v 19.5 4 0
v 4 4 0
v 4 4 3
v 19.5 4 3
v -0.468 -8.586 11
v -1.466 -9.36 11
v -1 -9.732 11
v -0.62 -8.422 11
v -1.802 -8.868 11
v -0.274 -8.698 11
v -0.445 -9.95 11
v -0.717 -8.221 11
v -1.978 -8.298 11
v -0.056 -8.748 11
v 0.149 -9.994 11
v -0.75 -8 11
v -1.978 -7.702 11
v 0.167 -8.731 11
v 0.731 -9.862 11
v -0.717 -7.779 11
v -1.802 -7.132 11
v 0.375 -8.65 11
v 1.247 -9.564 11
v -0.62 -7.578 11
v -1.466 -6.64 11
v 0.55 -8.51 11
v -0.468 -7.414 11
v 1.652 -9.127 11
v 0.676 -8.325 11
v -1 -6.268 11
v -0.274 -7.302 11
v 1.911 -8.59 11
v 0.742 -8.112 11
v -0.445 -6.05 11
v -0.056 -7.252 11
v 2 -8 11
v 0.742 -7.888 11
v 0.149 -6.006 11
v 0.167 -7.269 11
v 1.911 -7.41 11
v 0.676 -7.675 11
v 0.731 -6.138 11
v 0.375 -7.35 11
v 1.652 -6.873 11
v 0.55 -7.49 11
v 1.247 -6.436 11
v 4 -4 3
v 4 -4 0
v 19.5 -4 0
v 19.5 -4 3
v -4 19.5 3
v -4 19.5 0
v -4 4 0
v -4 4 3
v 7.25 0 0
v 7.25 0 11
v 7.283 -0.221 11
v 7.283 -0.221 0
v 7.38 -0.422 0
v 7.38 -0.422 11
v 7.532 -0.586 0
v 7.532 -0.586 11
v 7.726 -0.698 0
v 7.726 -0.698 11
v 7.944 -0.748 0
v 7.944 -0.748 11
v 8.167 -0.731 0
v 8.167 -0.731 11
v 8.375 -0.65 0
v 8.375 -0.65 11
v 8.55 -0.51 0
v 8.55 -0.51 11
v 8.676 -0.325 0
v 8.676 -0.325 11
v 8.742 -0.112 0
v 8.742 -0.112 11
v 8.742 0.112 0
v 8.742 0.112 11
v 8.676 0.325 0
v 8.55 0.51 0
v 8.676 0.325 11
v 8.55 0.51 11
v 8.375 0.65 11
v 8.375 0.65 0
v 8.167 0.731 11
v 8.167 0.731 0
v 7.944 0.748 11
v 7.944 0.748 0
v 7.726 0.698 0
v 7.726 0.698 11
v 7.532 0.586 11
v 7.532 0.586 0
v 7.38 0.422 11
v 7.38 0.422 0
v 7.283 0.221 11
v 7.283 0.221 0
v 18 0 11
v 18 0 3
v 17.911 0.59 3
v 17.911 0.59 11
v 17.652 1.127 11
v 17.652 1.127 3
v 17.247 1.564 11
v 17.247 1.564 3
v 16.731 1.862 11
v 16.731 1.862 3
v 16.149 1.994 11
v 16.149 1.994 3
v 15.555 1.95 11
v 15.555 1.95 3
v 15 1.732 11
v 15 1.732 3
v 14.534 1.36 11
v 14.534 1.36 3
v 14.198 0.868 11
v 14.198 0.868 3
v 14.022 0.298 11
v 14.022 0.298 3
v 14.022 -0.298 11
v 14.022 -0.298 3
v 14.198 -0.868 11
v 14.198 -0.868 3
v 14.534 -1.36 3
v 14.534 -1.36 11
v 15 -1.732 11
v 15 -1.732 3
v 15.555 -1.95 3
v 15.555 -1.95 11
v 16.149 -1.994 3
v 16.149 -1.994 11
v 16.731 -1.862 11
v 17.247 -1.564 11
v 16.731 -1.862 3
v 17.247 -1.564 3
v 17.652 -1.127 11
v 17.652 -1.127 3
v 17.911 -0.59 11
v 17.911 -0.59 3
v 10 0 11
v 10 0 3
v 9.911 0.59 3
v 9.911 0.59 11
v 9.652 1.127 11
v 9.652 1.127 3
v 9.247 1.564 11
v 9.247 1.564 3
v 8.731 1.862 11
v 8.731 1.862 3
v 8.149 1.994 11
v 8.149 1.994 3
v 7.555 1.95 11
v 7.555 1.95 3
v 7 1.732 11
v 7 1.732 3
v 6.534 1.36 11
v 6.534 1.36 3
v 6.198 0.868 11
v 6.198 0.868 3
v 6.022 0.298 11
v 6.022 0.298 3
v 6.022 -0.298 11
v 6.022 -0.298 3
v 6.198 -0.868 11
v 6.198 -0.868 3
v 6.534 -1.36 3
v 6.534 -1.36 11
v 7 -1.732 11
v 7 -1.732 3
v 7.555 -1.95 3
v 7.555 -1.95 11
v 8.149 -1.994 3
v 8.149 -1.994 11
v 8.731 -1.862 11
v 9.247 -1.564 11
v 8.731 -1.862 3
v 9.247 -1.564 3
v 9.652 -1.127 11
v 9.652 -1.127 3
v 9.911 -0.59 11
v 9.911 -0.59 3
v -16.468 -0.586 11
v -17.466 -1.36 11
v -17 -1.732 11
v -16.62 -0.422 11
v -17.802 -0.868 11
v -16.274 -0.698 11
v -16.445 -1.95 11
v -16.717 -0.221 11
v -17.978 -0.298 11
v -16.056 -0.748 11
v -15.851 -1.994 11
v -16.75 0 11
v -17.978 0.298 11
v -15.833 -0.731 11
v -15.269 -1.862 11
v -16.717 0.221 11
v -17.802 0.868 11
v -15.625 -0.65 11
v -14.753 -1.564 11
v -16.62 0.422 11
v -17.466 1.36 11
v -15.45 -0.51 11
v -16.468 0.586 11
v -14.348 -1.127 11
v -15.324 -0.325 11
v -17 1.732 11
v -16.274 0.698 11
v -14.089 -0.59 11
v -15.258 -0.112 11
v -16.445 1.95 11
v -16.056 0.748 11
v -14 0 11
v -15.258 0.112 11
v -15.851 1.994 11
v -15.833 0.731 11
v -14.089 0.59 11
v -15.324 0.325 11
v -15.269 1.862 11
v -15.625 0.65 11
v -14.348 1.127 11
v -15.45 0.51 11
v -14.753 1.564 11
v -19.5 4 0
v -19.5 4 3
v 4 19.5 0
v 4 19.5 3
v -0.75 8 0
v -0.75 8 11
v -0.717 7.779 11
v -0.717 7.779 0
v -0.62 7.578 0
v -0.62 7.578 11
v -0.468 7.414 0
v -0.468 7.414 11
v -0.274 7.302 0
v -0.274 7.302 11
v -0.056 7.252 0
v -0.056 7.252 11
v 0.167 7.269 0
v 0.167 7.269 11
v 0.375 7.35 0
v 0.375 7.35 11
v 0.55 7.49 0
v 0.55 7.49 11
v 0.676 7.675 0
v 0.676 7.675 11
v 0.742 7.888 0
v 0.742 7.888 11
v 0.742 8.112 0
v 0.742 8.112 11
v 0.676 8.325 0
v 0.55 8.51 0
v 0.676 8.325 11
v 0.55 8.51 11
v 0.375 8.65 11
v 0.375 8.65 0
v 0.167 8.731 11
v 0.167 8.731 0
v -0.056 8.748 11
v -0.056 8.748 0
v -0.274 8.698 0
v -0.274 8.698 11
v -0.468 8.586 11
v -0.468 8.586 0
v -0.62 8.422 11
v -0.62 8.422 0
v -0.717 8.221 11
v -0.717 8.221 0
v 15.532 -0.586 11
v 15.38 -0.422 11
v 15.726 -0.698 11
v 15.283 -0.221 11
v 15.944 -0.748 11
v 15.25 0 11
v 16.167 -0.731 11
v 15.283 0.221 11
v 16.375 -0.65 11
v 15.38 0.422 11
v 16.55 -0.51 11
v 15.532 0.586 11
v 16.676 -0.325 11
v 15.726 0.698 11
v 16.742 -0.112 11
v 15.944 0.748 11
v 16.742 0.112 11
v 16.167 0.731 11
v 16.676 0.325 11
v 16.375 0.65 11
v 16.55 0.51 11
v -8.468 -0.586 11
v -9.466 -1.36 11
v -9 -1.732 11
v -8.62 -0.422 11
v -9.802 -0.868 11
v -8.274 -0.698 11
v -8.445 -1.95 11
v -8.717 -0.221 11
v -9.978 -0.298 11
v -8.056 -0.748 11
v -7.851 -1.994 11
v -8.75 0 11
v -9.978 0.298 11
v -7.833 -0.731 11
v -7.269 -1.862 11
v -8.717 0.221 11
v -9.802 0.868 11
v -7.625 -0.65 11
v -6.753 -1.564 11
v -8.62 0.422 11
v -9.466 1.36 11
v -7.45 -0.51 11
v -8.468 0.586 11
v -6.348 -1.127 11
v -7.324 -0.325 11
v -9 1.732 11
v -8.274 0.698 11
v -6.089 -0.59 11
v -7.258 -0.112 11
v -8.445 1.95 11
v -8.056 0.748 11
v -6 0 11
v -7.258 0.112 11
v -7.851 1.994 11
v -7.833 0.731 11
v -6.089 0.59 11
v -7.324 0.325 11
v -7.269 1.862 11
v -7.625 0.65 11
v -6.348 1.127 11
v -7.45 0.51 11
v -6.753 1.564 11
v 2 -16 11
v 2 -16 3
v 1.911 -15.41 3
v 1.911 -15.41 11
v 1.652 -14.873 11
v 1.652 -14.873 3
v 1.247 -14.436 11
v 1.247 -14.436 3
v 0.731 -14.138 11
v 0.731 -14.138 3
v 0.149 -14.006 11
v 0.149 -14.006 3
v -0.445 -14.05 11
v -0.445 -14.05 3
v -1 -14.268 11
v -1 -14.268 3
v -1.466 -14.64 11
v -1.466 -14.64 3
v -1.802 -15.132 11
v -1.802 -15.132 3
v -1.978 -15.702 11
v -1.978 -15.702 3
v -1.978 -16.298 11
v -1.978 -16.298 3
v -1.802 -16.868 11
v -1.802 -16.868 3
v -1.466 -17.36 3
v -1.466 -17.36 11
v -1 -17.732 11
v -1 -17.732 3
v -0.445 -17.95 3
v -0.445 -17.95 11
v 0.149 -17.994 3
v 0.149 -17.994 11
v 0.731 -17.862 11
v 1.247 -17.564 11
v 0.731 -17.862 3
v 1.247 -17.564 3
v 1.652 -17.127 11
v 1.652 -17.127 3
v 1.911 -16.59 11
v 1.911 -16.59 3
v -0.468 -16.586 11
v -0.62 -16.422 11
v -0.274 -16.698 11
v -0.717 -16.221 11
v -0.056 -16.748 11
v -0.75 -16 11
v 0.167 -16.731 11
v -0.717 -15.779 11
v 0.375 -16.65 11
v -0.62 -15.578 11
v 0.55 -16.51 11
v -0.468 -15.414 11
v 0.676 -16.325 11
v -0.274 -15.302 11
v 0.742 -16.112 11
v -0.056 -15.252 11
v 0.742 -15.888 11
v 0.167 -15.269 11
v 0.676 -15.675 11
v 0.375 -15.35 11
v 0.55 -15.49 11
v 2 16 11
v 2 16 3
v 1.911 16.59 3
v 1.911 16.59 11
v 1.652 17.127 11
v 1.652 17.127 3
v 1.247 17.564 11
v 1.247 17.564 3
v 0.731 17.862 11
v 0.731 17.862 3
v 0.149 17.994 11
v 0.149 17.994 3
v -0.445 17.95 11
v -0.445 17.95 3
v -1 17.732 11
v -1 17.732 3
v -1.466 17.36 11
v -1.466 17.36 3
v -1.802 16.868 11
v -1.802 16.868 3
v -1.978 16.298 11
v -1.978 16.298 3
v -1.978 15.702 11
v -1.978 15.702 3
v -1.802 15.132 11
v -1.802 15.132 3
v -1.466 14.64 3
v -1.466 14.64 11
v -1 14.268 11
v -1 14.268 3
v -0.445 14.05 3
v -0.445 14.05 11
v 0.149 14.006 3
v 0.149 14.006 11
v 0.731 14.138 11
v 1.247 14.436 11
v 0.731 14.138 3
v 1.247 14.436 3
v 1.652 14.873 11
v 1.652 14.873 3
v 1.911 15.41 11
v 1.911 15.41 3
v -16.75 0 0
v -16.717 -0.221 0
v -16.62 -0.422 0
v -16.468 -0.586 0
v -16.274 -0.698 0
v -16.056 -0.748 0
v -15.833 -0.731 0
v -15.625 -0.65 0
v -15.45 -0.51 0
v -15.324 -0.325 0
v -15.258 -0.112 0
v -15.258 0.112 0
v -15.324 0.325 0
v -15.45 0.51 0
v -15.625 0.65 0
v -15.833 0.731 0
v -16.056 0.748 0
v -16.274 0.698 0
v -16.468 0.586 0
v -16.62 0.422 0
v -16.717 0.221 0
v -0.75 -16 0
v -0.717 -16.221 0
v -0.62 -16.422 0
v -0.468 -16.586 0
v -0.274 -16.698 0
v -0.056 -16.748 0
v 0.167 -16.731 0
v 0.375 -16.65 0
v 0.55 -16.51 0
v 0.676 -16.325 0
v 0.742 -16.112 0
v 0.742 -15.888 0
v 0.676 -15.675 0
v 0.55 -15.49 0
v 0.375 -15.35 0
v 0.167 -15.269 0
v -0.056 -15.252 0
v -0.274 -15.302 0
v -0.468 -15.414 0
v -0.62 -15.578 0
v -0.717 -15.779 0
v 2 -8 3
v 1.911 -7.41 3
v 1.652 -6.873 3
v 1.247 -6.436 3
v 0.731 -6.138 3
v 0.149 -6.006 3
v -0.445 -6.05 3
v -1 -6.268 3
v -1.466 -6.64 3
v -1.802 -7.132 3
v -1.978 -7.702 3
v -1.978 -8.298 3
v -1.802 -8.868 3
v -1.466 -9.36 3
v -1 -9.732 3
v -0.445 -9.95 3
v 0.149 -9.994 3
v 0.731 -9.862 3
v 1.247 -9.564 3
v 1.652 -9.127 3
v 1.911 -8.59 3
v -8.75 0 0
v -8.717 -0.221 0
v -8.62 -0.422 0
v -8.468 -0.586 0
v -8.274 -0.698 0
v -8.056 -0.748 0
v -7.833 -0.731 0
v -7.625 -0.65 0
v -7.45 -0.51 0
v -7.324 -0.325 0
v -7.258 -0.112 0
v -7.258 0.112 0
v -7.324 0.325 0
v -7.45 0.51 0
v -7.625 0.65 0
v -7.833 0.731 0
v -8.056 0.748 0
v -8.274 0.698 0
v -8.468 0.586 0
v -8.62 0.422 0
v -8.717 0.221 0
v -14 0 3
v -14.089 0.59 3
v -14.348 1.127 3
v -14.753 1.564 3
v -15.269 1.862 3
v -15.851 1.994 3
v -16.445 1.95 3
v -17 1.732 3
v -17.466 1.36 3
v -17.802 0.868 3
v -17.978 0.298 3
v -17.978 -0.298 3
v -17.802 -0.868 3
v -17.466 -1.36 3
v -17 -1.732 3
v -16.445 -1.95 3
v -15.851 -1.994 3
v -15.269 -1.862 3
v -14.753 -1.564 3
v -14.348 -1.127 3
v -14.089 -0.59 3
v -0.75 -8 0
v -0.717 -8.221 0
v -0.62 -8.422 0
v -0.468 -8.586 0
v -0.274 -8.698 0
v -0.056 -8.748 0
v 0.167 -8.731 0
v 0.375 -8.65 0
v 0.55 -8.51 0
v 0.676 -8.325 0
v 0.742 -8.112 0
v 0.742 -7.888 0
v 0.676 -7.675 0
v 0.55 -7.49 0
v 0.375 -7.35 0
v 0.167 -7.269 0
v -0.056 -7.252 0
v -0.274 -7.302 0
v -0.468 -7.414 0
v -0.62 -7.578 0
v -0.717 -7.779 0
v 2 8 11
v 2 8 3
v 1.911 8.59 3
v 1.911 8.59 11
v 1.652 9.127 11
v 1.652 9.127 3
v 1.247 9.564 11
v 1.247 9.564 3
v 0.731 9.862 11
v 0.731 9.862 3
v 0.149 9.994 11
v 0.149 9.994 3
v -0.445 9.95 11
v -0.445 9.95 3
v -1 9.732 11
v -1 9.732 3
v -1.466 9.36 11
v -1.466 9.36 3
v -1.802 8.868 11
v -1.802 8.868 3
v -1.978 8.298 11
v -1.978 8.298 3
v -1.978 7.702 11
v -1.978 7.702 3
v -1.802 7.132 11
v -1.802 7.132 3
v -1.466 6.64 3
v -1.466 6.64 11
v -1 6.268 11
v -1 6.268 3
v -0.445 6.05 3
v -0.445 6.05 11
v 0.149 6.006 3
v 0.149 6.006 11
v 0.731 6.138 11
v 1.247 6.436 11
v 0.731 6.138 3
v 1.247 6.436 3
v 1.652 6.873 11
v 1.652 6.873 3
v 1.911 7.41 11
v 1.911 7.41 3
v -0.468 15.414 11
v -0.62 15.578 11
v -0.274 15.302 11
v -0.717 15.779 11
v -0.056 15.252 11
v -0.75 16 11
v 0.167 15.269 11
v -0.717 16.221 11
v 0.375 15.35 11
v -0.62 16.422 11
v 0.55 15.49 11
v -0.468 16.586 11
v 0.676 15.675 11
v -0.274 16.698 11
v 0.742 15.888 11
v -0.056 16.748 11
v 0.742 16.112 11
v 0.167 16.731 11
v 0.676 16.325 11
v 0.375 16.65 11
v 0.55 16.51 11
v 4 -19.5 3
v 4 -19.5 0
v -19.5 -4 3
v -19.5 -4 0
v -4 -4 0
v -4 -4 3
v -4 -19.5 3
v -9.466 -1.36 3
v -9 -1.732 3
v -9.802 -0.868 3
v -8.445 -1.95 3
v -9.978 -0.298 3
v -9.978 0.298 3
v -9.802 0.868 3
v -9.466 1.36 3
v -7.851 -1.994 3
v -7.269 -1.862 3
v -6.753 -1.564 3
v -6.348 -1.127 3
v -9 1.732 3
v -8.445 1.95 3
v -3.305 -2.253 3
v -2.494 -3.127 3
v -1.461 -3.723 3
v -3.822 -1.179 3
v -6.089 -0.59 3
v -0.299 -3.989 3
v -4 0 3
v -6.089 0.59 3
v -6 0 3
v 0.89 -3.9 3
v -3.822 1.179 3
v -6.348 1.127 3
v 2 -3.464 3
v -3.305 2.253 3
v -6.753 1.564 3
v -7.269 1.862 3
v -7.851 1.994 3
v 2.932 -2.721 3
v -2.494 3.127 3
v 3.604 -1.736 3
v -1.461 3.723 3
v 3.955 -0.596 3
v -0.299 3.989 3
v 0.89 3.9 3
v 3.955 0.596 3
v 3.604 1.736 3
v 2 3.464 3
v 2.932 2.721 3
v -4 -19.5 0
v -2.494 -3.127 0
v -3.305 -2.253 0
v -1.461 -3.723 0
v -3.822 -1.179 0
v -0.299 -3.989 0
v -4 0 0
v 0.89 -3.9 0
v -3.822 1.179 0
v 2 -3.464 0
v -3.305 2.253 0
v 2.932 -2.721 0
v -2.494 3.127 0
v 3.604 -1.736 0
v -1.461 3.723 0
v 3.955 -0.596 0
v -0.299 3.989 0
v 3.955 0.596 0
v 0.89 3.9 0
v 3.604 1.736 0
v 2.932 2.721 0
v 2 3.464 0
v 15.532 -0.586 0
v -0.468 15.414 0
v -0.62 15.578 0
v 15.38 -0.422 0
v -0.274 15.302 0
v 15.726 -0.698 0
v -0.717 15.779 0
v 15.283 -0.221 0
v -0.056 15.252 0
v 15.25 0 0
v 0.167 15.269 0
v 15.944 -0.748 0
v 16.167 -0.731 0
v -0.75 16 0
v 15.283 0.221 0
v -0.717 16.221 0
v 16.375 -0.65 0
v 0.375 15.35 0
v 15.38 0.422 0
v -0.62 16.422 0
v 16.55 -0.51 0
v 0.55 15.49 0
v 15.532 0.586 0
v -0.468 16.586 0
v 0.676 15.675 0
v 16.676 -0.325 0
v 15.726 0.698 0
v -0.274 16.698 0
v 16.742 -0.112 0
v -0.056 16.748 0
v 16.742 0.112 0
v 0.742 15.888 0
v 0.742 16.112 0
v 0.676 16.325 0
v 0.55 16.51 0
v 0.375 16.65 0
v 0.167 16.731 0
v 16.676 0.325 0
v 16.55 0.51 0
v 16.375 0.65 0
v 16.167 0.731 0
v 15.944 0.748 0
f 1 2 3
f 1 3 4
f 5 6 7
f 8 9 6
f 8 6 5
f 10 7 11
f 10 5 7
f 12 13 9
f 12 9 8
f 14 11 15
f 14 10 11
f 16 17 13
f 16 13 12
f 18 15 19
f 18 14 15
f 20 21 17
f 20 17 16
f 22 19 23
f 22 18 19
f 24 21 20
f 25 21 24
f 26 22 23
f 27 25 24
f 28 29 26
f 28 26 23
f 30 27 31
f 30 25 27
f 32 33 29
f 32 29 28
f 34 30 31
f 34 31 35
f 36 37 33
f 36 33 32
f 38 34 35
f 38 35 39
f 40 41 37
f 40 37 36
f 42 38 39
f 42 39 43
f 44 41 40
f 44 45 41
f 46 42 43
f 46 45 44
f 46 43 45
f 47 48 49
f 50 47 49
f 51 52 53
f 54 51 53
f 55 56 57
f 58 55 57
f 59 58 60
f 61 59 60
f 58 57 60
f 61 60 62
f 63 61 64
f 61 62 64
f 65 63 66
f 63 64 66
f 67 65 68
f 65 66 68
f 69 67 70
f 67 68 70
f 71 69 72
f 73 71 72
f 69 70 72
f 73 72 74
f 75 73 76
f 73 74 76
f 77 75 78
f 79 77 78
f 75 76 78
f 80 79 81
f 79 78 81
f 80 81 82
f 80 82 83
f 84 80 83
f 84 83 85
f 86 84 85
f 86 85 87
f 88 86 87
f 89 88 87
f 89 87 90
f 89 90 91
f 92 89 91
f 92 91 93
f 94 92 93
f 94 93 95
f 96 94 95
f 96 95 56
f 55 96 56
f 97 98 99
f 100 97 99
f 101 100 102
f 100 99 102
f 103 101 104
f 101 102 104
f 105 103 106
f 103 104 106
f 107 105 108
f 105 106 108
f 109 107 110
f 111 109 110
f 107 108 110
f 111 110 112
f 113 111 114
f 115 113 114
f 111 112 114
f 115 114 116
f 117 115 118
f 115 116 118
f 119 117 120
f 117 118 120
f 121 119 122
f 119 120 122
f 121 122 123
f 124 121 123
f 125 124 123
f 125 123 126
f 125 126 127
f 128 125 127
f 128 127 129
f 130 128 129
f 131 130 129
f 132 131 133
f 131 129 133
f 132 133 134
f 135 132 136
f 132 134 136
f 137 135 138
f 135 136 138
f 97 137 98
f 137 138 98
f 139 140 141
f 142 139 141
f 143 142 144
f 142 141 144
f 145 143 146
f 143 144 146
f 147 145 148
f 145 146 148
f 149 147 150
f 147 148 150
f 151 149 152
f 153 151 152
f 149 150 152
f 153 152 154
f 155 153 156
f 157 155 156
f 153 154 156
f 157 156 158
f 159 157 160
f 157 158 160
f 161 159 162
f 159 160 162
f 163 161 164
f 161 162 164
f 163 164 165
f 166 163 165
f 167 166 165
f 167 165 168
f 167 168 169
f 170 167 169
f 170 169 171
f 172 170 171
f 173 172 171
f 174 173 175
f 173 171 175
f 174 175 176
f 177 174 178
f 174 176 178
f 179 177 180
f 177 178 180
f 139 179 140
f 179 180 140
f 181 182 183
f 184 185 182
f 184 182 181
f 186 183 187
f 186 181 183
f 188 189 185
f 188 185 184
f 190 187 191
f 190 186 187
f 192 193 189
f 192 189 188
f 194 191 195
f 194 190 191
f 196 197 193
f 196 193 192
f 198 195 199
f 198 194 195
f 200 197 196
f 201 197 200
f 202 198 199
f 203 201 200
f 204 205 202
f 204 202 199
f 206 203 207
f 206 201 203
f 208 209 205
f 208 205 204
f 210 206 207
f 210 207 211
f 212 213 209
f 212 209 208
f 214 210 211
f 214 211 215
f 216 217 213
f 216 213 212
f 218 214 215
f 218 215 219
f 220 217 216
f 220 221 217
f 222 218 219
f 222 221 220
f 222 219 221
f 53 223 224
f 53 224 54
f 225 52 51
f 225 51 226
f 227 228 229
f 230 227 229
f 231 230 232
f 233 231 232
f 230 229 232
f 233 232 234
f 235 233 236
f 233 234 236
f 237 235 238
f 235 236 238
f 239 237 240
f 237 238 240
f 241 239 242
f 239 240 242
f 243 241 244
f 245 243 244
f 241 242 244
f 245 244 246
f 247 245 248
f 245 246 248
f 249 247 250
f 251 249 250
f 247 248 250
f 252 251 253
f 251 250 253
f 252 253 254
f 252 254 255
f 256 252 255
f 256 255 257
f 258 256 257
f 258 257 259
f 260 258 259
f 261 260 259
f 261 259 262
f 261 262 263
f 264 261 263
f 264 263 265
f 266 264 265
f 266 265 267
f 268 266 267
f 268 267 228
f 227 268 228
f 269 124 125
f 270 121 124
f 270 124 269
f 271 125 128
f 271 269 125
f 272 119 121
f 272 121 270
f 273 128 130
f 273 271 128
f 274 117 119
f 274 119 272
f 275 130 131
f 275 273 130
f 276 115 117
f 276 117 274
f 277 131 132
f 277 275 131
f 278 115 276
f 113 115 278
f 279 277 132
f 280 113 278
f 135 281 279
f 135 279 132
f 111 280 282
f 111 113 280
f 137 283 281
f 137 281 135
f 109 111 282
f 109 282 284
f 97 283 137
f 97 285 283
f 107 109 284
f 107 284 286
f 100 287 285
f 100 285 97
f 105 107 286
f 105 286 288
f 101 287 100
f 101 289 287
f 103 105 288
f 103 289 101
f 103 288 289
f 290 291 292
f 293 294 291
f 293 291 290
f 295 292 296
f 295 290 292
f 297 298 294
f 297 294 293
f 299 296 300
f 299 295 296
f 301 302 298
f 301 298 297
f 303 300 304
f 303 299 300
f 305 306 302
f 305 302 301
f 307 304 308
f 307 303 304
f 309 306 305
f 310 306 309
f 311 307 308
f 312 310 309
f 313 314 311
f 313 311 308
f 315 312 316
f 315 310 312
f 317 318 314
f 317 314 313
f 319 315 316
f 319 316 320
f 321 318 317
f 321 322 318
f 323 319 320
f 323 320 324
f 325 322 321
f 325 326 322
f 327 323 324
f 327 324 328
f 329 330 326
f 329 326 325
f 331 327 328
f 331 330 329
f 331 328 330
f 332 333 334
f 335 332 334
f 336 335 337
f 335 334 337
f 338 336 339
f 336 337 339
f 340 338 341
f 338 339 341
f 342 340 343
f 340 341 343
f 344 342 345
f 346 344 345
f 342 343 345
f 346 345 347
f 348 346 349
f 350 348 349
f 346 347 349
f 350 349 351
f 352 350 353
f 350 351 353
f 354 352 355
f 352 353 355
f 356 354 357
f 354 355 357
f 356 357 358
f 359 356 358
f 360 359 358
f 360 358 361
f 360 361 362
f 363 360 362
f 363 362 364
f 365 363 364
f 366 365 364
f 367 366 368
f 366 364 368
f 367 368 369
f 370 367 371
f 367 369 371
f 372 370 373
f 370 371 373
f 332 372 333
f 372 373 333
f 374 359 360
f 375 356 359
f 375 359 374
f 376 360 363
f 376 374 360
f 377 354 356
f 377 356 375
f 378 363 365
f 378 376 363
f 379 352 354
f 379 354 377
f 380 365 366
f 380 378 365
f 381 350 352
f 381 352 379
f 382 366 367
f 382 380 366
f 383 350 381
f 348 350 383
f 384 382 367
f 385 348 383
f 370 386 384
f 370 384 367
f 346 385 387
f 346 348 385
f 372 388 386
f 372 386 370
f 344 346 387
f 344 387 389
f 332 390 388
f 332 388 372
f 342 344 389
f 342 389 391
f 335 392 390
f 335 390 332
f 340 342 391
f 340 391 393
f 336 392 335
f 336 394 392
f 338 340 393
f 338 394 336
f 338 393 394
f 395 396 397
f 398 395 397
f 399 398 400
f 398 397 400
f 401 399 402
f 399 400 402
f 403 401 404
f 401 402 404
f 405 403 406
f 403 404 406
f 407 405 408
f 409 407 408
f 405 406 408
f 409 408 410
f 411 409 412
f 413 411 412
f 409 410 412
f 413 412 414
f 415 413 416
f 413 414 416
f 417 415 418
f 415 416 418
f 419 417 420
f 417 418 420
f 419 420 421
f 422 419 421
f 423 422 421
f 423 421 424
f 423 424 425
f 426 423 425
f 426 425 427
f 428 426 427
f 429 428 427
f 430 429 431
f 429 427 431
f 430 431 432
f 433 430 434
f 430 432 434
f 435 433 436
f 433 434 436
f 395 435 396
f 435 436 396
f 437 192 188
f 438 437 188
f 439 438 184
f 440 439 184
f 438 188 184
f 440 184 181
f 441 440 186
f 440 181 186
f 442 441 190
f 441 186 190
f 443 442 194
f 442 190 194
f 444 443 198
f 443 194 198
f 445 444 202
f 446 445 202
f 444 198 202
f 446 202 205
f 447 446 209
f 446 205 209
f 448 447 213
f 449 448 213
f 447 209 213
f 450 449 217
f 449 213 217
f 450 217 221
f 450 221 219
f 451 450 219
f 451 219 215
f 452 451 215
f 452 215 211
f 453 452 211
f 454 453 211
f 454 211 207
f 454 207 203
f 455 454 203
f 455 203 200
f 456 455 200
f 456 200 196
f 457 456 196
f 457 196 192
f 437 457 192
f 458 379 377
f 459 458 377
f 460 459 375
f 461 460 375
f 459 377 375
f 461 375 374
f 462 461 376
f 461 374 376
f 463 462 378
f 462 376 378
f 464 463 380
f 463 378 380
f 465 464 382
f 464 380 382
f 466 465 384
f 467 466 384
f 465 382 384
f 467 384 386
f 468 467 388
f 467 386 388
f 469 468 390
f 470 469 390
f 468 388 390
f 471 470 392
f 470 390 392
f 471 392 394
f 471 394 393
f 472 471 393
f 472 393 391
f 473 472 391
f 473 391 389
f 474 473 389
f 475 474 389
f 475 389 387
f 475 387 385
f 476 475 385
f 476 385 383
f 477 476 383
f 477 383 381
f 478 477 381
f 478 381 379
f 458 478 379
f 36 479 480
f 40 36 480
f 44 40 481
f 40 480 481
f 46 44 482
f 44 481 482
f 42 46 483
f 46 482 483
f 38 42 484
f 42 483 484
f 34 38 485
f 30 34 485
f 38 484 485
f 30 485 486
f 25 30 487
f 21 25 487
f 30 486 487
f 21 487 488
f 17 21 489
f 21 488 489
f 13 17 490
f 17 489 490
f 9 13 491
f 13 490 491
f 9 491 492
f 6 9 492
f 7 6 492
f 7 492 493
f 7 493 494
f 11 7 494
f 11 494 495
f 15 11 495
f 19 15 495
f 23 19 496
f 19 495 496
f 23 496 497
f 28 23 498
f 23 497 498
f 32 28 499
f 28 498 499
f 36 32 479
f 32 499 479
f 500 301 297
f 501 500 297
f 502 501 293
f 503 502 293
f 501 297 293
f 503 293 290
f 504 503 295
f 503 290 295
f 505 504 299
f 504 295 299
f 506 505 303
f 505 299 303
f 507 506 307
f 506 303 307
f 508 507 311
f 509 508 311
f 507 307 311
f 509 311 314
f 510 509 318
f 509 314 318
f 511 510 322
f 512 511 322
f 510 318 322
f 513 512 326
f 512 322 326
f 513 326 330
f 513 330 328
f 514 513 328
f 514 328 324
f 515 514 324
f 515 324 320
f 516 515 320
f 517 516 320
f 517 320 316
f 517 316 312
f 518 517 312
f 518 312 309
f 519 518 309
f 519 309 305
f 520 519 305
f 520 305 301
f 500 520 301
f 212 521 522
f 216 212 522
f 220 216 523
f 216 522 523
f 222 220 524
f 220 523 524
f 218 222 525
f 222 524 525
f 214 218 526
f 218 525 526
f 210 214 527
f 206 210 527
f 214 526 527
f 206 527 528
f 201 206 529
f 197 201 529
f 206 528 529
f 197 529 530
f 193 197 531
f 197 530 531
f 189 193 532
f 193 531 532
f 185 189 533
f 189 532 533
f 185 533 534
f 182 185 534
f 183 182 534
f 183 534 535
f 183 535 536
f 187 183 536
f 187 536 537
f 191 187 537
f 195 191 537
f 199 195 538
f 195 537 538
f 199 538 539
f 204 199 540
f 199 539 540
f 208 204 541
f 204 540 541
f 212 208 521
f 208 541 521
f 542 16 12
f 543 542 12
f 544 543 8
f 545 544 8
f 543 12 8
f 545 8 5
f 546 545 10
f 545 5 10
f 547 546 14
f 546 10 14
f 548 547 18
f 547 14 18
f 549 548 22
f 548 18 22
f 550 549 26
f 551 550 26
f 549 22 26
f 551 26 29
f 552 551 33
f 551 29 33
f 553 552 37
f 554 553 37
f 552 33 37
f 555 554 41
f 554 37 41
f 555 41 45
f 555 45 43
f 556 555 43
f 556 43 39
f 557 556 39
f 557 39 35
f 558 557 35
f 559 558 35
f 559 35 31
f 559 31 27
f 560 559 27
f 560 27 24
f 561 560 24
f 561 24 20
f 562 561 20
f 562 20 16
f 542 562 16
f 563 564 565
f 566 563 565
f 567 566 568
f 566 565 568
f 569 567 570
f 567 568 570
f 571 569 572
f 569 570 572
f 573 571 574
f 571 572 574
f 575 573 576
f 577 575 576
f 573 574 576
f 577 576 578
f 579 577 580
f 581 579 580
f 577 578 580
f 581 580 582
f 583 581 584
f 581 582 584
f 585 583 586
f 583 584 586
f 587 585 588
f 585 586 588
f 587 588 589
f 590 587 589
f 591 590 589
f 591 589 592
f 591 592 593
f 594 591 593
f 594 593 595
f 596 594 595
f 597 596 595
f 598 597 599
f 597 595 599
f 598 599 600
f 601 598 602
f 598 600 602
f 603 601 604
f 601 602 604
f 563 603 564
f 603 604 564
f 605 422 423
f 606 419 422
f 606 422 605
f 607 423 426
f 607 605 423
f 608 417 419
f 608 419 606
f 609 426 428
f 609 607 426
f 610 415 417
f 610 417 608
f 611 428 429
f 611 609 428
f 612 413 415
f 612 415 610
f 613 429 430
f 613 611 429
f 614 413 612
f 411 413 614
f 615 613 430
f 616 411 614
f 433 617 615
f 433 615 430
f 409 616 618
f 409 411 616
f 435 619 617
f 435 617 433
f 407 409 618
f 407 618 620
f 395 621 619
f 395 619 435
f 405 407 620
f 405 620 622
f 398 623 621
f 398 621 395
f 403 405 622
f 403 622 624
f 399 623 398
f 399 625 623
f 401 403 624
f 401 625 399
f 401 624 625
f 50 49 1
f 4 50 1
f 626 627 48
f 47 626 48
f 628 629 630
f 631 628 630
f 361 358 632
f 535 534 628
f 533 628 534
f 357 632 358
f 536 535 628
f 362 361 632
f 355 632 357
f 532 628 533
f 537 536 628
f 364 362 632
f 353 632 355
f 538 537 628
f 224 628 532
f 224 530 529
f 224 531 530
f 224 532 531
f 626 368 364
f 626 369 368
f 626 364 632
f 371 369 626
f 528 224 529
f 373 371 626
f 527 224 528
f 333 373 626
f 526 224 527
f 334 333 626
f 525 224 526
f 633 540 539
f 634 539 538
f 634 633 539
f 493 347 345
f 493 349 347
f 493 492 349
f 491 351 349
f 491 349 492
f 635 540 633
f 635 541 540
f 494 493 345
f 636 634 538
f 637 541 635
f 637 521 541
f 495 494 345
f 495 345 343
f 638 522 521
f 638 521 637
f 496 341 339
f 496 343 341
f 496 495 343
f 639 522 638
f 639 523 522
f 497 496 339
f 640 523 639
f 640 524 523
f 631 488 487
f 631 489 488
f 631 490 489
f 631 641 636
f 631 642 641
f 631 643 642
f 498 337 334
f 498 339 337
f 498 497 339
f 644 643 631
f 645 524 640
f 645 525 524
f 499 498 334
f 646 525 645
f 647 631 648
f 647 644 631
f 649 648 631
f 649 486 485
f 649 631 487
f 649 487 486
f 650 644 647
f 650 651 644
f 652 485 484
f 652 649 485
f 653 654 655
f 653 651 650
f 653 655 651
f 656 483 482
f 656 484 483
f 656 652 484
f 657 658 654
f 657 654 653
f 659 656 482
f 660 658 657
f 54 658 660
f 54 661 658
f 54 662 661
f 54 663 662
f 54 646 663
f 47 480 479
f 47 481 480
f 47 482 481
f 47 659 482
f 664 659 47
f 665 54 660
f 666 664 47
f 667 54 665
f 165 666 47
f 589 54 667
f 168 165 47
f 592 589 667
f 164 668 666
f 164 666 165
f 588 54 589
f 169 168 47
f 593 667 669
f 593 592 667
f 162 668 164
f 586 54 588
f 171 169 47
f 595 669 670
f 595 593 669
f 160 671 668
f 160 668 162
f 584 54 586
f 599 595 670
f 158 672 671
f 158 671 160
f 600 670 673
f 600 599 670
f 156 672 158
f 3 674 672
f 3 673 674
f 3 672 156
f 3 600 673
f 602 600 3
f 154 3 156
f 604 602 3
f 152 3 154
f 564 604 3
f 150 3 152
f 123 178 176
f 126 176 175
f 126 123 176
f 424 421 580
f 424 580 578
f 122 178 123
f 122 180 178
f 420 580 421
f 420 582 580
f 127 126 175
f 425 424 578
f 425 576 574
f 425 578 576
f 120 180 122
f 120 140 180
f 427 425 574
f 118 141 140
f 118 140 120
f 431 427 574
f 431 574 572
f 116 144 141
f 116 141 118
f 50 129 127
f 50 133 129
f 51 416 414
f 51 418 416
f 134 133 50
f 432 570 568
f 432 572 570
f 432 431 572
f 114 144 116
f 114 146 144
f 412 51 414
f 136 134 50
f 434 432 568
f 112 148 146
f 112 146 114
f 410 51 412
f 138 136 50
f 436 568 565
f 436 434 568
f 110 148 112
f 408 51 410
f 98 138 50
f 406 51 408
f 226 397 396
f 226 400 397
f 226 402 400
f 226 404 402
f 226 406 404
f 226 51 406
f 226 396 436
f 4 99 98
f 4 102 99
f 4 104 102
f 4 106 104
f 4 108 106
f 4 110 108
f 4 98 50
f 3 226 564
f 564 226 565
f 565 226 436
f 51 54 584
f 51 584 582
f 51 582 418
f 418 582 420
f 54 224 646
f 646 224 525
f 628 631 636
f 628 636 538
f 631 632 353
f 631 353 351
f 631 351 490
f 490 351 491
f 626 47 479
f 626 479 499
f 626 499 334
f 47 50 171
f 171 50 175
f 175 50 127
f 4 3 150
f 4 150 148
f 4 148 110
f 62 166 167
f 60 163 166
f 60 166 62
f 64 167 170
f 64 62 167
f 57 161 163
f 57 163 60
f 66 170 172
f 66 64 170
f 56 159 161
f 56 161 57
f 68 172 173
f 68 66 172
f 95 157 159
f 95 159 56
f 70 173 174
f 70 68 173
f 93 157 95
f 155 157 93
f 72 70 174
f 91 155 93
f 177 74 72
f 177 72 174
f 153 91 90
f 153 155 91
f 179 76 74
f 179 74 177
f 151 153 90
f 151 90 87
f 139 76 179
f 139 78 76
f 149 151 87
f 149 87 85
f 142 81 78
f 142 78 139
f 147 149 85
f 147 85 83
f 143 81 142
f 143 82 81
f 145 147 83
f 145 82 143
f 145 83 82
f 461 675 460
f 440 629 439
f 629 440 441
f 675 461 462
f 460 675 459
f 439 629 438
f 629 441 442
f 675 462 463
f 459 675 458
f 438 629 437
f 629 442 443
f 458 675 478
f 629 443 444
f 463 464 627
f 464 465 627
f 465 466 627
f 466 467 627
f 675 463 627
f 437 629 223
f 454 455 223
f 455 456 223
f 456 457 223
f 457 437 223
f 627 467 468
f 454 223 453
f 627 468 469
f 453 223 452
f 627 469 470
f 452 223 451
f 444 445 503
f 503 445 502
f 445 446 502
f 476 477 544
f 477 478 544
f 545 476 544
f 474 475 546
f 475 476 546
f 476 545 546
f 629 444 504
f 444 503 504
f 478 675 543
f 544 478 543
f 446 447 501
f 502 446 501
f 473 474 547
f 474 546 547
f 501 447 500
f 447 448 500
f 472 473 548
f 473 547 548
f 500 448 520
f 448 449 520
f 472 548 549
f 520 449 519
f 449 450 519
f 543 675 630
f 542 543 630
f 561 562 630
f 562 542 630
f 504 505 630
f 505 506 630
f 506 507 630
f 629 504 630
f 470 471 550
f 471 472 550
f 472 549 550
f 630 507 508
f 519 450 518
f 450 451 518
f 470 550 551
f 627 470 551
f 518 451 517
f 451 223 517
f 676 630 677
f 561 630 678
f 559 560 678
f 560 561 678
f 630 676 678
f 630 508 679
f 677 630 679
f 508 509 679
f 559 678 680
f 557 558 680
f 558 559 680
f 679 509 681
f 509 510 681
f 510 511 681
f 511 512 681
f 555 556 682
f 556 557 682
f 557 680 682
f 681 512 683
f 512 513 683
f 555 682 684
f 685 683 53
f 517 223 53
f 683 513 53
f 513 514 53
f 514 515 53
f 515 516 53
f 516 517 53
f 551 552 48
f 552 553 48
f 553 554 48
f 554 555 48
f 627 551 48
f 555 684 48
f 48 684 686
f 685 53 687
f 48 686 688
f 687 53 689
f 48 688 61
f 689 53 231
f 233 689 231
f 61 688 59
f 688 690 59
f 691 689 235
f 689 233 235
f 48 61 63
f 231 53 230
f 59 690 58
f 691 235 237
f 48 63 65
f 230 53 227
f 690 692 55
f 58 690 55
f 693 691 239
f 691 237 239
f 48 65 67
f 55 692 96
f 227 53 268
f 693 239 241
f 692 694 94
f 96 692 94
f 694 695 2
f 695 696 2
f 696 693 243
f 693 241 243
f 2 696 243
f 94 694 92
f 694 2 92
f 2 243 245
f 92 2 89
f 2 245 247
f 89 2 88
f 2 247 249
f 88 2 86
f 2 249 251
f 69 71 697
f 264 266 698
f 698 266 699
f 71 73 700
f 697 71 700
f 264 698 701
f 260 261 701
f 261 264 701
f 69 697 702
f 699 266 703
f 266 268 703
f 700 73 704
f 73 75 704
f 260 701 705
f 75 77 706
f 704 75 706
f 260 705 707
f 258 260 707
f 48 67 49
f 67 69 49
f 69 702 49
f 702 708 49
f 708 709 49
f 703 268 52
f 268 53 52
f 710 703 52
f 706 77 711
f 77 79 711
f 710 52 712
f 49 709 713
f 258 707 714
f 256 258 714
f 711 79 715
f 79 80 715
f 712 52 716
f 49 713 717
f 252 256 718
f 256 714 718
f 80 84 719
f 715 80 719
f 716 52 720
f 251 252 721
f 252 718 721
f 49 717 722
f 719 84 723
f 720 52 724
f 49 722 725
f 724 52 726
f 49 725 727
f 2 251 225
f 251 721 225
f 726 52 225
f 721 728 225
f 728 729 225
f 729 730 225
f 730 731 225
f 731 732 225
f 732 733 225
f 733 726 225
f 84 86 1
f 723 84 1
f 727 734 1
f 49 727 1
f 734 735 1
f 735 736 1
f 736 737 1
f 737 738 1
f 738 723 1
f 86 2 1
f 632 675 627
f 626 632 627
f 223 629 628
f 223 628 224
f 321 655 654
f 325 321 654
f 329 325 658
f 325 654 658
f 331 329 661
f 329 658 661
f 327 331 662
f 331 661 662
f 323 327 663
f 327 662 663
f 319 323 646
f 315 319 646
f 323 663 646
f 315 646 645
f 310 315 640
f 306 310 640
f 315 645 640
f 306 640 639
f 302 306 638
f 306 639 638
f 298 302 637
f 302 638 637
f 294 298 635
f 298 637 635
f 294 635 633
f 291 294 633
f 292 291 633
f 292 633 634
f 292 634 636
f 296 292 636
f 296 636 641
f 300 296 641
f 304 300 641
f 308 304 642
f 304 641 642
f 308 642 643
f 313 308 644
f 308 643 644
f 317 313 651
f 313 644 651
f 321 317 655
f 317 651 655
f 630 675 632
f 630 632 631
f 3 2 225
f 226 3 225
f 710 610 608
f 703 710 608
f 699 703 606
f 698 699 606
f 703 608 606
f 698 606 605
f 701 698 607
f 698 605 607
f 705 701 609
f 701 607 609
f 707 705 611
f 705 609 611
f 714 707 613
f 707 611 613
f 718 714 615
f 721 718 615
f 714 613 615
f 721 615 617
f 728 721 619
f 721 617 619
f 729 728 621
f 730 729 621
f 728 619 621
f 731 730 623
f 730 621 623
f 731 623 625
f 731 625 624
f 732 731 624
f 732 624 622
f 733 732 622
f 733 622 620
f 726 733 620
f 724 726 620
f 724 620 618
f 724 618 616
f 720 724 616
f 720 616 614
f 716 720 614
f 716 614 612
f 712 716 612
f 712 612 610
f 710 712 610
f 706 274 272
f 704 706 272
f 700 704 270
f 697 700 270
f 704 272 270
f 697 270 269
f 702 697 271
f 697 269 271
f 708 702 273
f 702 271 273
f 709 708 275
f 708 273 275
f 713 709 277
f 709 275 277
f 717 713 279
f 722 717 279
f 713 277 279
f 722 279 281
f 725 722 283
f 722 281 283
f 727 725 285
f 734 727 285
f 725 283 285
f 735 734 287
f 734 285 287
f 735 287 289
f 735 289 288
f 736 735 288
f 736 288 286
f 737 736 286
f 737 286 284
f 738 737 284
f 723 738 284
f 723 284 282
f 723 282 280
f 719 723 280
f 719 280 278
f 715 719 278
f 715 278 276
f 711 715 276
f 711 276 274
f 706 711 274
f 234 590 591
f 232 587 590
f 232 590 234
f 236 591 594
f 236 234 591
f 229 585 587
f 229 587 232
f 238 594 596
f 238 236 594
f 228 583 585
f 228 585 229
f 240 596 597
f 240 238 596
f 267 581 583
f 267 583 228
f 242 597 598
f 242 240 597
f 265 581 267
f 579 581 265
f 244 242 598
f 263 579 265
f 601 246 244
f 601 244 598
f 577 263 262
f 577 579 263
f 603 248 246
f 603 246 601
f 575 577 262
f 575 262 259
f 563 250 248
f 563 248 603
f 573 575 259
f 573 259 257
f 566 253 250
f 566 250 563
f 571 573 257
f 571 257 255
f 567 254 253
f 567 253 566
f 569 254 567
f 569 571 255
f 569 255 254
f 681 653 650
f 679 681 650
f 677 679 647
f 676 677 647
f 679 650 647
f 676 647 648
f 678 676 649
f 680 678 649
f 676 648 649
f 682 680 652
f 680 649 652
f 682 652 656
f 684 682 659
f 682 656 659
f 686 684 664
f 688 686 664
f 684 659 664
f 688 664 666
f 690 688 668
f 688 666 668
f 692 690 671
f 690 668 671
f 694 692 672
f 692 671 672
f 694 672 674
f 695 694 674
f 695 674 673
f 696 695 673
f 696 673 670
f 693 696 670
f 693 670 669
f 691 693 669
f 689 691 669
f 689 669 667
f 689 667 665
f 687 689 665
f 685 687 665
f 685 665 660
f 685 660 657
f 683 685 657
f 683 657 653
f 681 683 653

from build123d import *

# Parameters (mm, degrees)
F0_W     = 8
F0_H     = 8
F0_H_2   = 15.5
F0_W_2   = 15.5
F1_DEPTH = 3
F3_D     = 8
F4_R     = 2
F5_DEPTH = 8
F7_D     = 1.5


with BuildPart() as f1:
    # F0 (on Top) → F1 (new body)
    with BuildSketch(Plane.XY):
        Rectangle(F0_W, F0_H)
        with Locations((0, 11.75)):
            Rectangle(F0_W, F0_H_2)
        with Locations((-11.75, 0)):
            Rectangle(F0_W_2, F0_H)
        with Locations((11.75, 0)):
            Rectangle(F0_W_2, F0_H)
        with Locations((0, -11.75)):
            Rectangle(F0_W, F0_H_2)
    extrude(amount=F1_DEPTH)

    # F3 (through all)
    with Locations(Plane(origin=(0, 0, 0), x_dir=(1, 0, 0), z_dir=(0, 0, -1))):
        with Locations((0, 0)):
            Hole(F3_D / 2)

    # F4 (on face) → F5 (join)
    with BuildSketch(Plane.XY.offset(3)):
        with Locations((-16, 0)):
            Circle(F4_R)
        with Locations((-8, 0)):
            Circle(F4_R)
        with Locations((0, -8)):
            Circle(F4_R)
        with Locations((0, -16)):
            Circle(F4_R)
        with Locations((8, 0)):
            Circle(F4_R)
        with Locations((16, 0)):
            Circle(F4_R)
        with Locations((0, 8)):
            Circle(F4_R)
        with Locations((0, 16)):
            Circle(F4_R)
    extrude(amount=F5_DEPTH)

    # F7 (through all)
    with Locations(Plane(origin=(0, 0, 0), x_dir=(1, 0, 0), z_dir=(0, 0, -1))):
        with Locations((-16, 0), (-8, 0), (0, -16), (0, -8), (8, 0), (16, 0), (0, 8), (0, 16)):
            Hole(F7_D / 2)


solid = f1.part
